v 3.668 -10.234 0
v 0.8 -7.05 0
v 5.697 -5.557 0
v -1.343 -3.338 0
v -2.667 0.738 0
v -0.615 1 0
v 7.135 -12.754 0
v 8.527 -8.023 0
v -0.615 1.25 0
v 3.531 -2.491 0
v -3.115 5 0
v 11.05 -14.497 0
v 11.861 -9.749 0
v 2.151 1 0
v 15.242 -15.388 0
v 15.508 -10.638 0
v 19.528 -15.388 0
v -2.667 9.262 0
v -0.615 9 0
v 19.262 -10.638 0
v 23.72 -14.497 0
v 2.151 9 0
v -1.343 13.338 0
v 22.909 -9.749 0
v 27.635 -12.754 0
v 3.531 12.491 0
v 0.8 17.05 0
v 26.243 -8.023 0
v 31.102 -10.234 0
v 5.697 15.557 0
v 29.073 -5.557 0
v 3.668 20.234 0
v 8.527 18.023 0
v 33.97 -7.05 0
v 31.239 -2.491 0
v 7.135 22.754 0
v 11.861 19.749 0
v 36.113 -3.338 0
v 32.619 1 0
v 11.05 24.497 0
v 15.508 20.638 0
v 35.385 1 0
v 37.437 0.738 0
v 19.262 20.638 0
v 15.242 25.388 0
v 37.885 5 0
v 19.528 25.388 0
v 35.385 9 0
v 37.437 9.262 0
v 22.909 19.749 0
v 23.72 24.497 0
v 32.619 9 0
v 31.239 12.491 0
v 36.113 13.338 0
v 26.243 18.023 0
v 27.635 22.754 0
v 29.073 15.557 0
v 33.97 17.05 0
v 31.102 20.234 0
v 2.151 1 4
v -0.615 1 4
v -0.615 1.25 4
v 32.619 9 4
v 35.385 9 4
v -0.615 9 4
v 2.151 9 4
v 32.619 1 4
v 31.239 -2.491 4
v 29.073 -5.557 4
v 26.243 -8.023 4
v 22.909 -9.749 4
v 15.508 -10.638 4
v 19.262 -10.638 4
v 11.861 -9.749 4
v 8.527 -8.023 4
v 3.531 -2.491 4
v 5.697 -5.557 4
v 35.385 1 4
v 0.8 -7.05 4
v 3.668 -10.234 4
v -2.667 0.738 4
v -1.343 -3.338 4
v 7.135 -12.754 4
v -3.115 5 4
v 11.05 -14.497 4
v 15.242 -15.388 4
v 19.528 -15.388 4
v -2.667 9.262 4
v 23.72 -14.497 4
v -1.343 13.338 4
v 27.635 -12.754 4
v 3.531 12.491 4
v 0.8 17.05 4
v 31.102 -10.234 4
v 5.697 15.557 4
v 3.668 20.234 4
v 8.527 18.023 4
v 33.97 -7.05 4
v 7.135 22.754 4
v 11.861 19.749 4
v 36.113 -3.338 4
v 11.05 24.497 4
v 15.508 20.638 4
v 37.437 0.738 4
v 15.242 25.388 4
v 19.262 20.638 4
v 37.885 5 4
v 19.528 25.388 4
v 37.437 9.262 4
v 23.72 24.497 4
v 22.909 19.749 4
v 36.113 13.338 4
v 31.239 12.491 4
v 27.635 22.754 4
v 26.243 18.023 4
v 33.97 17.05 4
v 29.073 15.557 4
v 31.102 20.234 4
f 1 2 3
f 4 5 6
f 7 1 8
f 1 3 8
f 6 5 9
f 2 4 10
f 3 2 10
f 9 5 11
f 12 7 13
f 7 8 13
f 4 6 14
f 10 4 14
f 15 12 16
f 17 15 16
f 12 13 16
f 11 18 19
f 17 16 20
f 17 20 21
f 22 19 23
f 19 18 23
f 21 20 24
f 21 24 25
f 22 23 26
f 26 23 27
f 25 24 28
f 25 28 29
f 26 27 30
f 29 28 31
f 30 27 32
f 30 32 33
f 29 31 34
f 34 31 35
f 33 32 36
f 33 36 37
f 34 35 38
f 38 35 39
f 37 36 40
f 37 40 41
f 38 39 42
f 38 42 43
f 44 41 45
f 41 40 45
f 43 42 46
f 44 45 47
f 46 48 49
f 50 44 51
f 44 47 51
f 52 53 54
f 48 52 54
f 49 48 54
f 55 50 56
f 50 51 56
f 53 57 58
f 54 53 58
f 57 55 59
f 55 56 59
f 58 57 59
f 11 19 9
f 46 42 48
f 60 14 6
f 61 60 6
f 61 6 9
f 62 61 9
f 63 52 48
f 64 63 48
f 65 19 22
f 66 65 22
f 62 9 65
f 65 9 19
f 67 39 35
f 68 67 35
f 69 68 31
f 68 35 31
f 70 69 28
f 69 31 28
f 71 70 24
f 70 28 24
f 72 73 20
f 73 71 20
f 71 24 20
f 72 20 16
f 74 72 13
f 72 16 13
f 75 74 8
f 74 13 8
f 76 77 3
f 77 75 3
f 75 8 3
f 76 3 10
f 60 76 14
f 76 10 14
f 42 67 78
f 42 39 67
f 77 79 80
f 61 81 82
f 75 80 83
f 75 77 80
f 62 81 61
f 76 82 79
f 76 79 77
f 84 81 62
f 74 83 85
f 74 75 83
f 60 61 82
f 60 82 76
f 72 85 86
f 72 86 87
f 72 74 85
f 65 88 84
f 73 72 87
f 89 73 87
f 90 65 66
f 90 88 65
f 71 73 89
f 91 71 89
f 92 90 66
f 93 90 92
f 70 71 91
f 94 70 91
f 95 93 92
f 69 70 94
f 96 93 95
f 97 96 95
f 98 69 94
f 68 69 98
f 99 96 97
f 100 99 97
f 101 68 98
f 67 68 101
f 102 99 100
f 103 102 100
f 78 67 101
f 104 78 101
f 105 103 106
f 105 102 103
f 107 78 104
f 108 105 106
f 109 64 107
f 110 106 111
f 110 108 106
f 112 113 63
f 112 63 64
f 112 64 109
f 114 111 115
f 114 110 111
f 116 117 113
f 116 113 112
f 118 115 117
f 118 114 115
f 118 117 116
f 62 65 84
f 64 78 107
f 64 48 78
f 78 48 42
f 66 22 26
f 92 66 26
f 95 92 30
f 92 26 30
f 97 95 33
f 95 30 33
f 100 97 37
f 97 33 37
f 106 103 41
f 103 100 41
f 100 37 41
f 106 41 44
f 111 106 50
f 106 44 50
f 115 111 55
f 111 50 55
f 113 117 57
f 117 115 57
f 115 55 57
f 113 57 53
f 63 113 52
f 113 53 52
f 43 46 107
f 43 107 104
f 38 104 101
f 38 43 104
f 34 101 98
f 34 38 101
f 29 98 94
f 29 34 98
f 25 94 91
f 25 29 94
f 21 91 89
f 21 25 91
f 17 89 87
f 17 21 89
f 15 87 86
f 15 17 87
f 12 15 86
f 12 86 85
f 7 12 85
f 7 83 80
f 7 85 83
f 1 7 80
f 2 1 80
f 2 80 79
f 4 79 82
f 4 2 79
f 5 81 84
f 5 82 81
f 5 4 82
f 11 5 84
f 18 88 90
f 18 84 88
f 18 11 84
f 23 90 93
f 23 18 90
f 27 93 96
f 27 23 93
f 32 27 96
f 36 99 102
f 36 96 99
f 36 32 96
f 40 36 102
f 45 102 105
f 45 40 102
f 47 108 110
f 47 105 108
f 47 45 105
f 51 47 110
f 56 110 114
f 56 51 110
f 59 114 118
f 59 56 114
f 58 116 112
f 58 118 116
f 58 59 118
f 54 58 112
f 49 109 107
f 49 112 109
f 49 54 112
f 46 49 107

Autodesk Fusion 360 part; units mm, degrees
sketch "Sketch1" plane through (0, 0, 0) normal (0, 0, 1) x (1, 0, 0)
  circle A0 centre (17.385, 5) radius 20.5
  line L0 (0, 8.75) -> (0, 8.6219)
  line L1 (-0.615, 1.25) -> (0, 1.3781) construction
  line L2 (0, 8.6219) -> (0, 8.75)
  line L3 (0, 1.25) -> (-0.615, 1.25)
  line L4 (-0.615, 1) -> (-0.615, 9)
  line L5 (35.385, 9) -> (35.385, 1)
  line L6 (-0.615, 9) -> (2.1514, 9)
  line L7 (32.6186, 9) -> (35.385, 9)
  line L8 (2.1514, 1) -> (-0.615, 1)
  arc A1 (2.1514, 1) -> (32.6186, 1) centre (17.385, 5) ccw
  arc A2 (32.6186, 9) -> (2.1514, 9) centre (17.385, 5) ccw
  line L9 (32.6186, 1) -> (35.385, 1)
  point P0 (17.385, 5)
  point P1 (17.385, 5)
  point P2 (17.385, 5)
  dimension "d4" = 41
  dimension "d11" = 36
  dimension "d12" = 8
  dimension "d13" = 31.5
extrude "Extrude1" add sketch "Sketch1" along normal blind 4
